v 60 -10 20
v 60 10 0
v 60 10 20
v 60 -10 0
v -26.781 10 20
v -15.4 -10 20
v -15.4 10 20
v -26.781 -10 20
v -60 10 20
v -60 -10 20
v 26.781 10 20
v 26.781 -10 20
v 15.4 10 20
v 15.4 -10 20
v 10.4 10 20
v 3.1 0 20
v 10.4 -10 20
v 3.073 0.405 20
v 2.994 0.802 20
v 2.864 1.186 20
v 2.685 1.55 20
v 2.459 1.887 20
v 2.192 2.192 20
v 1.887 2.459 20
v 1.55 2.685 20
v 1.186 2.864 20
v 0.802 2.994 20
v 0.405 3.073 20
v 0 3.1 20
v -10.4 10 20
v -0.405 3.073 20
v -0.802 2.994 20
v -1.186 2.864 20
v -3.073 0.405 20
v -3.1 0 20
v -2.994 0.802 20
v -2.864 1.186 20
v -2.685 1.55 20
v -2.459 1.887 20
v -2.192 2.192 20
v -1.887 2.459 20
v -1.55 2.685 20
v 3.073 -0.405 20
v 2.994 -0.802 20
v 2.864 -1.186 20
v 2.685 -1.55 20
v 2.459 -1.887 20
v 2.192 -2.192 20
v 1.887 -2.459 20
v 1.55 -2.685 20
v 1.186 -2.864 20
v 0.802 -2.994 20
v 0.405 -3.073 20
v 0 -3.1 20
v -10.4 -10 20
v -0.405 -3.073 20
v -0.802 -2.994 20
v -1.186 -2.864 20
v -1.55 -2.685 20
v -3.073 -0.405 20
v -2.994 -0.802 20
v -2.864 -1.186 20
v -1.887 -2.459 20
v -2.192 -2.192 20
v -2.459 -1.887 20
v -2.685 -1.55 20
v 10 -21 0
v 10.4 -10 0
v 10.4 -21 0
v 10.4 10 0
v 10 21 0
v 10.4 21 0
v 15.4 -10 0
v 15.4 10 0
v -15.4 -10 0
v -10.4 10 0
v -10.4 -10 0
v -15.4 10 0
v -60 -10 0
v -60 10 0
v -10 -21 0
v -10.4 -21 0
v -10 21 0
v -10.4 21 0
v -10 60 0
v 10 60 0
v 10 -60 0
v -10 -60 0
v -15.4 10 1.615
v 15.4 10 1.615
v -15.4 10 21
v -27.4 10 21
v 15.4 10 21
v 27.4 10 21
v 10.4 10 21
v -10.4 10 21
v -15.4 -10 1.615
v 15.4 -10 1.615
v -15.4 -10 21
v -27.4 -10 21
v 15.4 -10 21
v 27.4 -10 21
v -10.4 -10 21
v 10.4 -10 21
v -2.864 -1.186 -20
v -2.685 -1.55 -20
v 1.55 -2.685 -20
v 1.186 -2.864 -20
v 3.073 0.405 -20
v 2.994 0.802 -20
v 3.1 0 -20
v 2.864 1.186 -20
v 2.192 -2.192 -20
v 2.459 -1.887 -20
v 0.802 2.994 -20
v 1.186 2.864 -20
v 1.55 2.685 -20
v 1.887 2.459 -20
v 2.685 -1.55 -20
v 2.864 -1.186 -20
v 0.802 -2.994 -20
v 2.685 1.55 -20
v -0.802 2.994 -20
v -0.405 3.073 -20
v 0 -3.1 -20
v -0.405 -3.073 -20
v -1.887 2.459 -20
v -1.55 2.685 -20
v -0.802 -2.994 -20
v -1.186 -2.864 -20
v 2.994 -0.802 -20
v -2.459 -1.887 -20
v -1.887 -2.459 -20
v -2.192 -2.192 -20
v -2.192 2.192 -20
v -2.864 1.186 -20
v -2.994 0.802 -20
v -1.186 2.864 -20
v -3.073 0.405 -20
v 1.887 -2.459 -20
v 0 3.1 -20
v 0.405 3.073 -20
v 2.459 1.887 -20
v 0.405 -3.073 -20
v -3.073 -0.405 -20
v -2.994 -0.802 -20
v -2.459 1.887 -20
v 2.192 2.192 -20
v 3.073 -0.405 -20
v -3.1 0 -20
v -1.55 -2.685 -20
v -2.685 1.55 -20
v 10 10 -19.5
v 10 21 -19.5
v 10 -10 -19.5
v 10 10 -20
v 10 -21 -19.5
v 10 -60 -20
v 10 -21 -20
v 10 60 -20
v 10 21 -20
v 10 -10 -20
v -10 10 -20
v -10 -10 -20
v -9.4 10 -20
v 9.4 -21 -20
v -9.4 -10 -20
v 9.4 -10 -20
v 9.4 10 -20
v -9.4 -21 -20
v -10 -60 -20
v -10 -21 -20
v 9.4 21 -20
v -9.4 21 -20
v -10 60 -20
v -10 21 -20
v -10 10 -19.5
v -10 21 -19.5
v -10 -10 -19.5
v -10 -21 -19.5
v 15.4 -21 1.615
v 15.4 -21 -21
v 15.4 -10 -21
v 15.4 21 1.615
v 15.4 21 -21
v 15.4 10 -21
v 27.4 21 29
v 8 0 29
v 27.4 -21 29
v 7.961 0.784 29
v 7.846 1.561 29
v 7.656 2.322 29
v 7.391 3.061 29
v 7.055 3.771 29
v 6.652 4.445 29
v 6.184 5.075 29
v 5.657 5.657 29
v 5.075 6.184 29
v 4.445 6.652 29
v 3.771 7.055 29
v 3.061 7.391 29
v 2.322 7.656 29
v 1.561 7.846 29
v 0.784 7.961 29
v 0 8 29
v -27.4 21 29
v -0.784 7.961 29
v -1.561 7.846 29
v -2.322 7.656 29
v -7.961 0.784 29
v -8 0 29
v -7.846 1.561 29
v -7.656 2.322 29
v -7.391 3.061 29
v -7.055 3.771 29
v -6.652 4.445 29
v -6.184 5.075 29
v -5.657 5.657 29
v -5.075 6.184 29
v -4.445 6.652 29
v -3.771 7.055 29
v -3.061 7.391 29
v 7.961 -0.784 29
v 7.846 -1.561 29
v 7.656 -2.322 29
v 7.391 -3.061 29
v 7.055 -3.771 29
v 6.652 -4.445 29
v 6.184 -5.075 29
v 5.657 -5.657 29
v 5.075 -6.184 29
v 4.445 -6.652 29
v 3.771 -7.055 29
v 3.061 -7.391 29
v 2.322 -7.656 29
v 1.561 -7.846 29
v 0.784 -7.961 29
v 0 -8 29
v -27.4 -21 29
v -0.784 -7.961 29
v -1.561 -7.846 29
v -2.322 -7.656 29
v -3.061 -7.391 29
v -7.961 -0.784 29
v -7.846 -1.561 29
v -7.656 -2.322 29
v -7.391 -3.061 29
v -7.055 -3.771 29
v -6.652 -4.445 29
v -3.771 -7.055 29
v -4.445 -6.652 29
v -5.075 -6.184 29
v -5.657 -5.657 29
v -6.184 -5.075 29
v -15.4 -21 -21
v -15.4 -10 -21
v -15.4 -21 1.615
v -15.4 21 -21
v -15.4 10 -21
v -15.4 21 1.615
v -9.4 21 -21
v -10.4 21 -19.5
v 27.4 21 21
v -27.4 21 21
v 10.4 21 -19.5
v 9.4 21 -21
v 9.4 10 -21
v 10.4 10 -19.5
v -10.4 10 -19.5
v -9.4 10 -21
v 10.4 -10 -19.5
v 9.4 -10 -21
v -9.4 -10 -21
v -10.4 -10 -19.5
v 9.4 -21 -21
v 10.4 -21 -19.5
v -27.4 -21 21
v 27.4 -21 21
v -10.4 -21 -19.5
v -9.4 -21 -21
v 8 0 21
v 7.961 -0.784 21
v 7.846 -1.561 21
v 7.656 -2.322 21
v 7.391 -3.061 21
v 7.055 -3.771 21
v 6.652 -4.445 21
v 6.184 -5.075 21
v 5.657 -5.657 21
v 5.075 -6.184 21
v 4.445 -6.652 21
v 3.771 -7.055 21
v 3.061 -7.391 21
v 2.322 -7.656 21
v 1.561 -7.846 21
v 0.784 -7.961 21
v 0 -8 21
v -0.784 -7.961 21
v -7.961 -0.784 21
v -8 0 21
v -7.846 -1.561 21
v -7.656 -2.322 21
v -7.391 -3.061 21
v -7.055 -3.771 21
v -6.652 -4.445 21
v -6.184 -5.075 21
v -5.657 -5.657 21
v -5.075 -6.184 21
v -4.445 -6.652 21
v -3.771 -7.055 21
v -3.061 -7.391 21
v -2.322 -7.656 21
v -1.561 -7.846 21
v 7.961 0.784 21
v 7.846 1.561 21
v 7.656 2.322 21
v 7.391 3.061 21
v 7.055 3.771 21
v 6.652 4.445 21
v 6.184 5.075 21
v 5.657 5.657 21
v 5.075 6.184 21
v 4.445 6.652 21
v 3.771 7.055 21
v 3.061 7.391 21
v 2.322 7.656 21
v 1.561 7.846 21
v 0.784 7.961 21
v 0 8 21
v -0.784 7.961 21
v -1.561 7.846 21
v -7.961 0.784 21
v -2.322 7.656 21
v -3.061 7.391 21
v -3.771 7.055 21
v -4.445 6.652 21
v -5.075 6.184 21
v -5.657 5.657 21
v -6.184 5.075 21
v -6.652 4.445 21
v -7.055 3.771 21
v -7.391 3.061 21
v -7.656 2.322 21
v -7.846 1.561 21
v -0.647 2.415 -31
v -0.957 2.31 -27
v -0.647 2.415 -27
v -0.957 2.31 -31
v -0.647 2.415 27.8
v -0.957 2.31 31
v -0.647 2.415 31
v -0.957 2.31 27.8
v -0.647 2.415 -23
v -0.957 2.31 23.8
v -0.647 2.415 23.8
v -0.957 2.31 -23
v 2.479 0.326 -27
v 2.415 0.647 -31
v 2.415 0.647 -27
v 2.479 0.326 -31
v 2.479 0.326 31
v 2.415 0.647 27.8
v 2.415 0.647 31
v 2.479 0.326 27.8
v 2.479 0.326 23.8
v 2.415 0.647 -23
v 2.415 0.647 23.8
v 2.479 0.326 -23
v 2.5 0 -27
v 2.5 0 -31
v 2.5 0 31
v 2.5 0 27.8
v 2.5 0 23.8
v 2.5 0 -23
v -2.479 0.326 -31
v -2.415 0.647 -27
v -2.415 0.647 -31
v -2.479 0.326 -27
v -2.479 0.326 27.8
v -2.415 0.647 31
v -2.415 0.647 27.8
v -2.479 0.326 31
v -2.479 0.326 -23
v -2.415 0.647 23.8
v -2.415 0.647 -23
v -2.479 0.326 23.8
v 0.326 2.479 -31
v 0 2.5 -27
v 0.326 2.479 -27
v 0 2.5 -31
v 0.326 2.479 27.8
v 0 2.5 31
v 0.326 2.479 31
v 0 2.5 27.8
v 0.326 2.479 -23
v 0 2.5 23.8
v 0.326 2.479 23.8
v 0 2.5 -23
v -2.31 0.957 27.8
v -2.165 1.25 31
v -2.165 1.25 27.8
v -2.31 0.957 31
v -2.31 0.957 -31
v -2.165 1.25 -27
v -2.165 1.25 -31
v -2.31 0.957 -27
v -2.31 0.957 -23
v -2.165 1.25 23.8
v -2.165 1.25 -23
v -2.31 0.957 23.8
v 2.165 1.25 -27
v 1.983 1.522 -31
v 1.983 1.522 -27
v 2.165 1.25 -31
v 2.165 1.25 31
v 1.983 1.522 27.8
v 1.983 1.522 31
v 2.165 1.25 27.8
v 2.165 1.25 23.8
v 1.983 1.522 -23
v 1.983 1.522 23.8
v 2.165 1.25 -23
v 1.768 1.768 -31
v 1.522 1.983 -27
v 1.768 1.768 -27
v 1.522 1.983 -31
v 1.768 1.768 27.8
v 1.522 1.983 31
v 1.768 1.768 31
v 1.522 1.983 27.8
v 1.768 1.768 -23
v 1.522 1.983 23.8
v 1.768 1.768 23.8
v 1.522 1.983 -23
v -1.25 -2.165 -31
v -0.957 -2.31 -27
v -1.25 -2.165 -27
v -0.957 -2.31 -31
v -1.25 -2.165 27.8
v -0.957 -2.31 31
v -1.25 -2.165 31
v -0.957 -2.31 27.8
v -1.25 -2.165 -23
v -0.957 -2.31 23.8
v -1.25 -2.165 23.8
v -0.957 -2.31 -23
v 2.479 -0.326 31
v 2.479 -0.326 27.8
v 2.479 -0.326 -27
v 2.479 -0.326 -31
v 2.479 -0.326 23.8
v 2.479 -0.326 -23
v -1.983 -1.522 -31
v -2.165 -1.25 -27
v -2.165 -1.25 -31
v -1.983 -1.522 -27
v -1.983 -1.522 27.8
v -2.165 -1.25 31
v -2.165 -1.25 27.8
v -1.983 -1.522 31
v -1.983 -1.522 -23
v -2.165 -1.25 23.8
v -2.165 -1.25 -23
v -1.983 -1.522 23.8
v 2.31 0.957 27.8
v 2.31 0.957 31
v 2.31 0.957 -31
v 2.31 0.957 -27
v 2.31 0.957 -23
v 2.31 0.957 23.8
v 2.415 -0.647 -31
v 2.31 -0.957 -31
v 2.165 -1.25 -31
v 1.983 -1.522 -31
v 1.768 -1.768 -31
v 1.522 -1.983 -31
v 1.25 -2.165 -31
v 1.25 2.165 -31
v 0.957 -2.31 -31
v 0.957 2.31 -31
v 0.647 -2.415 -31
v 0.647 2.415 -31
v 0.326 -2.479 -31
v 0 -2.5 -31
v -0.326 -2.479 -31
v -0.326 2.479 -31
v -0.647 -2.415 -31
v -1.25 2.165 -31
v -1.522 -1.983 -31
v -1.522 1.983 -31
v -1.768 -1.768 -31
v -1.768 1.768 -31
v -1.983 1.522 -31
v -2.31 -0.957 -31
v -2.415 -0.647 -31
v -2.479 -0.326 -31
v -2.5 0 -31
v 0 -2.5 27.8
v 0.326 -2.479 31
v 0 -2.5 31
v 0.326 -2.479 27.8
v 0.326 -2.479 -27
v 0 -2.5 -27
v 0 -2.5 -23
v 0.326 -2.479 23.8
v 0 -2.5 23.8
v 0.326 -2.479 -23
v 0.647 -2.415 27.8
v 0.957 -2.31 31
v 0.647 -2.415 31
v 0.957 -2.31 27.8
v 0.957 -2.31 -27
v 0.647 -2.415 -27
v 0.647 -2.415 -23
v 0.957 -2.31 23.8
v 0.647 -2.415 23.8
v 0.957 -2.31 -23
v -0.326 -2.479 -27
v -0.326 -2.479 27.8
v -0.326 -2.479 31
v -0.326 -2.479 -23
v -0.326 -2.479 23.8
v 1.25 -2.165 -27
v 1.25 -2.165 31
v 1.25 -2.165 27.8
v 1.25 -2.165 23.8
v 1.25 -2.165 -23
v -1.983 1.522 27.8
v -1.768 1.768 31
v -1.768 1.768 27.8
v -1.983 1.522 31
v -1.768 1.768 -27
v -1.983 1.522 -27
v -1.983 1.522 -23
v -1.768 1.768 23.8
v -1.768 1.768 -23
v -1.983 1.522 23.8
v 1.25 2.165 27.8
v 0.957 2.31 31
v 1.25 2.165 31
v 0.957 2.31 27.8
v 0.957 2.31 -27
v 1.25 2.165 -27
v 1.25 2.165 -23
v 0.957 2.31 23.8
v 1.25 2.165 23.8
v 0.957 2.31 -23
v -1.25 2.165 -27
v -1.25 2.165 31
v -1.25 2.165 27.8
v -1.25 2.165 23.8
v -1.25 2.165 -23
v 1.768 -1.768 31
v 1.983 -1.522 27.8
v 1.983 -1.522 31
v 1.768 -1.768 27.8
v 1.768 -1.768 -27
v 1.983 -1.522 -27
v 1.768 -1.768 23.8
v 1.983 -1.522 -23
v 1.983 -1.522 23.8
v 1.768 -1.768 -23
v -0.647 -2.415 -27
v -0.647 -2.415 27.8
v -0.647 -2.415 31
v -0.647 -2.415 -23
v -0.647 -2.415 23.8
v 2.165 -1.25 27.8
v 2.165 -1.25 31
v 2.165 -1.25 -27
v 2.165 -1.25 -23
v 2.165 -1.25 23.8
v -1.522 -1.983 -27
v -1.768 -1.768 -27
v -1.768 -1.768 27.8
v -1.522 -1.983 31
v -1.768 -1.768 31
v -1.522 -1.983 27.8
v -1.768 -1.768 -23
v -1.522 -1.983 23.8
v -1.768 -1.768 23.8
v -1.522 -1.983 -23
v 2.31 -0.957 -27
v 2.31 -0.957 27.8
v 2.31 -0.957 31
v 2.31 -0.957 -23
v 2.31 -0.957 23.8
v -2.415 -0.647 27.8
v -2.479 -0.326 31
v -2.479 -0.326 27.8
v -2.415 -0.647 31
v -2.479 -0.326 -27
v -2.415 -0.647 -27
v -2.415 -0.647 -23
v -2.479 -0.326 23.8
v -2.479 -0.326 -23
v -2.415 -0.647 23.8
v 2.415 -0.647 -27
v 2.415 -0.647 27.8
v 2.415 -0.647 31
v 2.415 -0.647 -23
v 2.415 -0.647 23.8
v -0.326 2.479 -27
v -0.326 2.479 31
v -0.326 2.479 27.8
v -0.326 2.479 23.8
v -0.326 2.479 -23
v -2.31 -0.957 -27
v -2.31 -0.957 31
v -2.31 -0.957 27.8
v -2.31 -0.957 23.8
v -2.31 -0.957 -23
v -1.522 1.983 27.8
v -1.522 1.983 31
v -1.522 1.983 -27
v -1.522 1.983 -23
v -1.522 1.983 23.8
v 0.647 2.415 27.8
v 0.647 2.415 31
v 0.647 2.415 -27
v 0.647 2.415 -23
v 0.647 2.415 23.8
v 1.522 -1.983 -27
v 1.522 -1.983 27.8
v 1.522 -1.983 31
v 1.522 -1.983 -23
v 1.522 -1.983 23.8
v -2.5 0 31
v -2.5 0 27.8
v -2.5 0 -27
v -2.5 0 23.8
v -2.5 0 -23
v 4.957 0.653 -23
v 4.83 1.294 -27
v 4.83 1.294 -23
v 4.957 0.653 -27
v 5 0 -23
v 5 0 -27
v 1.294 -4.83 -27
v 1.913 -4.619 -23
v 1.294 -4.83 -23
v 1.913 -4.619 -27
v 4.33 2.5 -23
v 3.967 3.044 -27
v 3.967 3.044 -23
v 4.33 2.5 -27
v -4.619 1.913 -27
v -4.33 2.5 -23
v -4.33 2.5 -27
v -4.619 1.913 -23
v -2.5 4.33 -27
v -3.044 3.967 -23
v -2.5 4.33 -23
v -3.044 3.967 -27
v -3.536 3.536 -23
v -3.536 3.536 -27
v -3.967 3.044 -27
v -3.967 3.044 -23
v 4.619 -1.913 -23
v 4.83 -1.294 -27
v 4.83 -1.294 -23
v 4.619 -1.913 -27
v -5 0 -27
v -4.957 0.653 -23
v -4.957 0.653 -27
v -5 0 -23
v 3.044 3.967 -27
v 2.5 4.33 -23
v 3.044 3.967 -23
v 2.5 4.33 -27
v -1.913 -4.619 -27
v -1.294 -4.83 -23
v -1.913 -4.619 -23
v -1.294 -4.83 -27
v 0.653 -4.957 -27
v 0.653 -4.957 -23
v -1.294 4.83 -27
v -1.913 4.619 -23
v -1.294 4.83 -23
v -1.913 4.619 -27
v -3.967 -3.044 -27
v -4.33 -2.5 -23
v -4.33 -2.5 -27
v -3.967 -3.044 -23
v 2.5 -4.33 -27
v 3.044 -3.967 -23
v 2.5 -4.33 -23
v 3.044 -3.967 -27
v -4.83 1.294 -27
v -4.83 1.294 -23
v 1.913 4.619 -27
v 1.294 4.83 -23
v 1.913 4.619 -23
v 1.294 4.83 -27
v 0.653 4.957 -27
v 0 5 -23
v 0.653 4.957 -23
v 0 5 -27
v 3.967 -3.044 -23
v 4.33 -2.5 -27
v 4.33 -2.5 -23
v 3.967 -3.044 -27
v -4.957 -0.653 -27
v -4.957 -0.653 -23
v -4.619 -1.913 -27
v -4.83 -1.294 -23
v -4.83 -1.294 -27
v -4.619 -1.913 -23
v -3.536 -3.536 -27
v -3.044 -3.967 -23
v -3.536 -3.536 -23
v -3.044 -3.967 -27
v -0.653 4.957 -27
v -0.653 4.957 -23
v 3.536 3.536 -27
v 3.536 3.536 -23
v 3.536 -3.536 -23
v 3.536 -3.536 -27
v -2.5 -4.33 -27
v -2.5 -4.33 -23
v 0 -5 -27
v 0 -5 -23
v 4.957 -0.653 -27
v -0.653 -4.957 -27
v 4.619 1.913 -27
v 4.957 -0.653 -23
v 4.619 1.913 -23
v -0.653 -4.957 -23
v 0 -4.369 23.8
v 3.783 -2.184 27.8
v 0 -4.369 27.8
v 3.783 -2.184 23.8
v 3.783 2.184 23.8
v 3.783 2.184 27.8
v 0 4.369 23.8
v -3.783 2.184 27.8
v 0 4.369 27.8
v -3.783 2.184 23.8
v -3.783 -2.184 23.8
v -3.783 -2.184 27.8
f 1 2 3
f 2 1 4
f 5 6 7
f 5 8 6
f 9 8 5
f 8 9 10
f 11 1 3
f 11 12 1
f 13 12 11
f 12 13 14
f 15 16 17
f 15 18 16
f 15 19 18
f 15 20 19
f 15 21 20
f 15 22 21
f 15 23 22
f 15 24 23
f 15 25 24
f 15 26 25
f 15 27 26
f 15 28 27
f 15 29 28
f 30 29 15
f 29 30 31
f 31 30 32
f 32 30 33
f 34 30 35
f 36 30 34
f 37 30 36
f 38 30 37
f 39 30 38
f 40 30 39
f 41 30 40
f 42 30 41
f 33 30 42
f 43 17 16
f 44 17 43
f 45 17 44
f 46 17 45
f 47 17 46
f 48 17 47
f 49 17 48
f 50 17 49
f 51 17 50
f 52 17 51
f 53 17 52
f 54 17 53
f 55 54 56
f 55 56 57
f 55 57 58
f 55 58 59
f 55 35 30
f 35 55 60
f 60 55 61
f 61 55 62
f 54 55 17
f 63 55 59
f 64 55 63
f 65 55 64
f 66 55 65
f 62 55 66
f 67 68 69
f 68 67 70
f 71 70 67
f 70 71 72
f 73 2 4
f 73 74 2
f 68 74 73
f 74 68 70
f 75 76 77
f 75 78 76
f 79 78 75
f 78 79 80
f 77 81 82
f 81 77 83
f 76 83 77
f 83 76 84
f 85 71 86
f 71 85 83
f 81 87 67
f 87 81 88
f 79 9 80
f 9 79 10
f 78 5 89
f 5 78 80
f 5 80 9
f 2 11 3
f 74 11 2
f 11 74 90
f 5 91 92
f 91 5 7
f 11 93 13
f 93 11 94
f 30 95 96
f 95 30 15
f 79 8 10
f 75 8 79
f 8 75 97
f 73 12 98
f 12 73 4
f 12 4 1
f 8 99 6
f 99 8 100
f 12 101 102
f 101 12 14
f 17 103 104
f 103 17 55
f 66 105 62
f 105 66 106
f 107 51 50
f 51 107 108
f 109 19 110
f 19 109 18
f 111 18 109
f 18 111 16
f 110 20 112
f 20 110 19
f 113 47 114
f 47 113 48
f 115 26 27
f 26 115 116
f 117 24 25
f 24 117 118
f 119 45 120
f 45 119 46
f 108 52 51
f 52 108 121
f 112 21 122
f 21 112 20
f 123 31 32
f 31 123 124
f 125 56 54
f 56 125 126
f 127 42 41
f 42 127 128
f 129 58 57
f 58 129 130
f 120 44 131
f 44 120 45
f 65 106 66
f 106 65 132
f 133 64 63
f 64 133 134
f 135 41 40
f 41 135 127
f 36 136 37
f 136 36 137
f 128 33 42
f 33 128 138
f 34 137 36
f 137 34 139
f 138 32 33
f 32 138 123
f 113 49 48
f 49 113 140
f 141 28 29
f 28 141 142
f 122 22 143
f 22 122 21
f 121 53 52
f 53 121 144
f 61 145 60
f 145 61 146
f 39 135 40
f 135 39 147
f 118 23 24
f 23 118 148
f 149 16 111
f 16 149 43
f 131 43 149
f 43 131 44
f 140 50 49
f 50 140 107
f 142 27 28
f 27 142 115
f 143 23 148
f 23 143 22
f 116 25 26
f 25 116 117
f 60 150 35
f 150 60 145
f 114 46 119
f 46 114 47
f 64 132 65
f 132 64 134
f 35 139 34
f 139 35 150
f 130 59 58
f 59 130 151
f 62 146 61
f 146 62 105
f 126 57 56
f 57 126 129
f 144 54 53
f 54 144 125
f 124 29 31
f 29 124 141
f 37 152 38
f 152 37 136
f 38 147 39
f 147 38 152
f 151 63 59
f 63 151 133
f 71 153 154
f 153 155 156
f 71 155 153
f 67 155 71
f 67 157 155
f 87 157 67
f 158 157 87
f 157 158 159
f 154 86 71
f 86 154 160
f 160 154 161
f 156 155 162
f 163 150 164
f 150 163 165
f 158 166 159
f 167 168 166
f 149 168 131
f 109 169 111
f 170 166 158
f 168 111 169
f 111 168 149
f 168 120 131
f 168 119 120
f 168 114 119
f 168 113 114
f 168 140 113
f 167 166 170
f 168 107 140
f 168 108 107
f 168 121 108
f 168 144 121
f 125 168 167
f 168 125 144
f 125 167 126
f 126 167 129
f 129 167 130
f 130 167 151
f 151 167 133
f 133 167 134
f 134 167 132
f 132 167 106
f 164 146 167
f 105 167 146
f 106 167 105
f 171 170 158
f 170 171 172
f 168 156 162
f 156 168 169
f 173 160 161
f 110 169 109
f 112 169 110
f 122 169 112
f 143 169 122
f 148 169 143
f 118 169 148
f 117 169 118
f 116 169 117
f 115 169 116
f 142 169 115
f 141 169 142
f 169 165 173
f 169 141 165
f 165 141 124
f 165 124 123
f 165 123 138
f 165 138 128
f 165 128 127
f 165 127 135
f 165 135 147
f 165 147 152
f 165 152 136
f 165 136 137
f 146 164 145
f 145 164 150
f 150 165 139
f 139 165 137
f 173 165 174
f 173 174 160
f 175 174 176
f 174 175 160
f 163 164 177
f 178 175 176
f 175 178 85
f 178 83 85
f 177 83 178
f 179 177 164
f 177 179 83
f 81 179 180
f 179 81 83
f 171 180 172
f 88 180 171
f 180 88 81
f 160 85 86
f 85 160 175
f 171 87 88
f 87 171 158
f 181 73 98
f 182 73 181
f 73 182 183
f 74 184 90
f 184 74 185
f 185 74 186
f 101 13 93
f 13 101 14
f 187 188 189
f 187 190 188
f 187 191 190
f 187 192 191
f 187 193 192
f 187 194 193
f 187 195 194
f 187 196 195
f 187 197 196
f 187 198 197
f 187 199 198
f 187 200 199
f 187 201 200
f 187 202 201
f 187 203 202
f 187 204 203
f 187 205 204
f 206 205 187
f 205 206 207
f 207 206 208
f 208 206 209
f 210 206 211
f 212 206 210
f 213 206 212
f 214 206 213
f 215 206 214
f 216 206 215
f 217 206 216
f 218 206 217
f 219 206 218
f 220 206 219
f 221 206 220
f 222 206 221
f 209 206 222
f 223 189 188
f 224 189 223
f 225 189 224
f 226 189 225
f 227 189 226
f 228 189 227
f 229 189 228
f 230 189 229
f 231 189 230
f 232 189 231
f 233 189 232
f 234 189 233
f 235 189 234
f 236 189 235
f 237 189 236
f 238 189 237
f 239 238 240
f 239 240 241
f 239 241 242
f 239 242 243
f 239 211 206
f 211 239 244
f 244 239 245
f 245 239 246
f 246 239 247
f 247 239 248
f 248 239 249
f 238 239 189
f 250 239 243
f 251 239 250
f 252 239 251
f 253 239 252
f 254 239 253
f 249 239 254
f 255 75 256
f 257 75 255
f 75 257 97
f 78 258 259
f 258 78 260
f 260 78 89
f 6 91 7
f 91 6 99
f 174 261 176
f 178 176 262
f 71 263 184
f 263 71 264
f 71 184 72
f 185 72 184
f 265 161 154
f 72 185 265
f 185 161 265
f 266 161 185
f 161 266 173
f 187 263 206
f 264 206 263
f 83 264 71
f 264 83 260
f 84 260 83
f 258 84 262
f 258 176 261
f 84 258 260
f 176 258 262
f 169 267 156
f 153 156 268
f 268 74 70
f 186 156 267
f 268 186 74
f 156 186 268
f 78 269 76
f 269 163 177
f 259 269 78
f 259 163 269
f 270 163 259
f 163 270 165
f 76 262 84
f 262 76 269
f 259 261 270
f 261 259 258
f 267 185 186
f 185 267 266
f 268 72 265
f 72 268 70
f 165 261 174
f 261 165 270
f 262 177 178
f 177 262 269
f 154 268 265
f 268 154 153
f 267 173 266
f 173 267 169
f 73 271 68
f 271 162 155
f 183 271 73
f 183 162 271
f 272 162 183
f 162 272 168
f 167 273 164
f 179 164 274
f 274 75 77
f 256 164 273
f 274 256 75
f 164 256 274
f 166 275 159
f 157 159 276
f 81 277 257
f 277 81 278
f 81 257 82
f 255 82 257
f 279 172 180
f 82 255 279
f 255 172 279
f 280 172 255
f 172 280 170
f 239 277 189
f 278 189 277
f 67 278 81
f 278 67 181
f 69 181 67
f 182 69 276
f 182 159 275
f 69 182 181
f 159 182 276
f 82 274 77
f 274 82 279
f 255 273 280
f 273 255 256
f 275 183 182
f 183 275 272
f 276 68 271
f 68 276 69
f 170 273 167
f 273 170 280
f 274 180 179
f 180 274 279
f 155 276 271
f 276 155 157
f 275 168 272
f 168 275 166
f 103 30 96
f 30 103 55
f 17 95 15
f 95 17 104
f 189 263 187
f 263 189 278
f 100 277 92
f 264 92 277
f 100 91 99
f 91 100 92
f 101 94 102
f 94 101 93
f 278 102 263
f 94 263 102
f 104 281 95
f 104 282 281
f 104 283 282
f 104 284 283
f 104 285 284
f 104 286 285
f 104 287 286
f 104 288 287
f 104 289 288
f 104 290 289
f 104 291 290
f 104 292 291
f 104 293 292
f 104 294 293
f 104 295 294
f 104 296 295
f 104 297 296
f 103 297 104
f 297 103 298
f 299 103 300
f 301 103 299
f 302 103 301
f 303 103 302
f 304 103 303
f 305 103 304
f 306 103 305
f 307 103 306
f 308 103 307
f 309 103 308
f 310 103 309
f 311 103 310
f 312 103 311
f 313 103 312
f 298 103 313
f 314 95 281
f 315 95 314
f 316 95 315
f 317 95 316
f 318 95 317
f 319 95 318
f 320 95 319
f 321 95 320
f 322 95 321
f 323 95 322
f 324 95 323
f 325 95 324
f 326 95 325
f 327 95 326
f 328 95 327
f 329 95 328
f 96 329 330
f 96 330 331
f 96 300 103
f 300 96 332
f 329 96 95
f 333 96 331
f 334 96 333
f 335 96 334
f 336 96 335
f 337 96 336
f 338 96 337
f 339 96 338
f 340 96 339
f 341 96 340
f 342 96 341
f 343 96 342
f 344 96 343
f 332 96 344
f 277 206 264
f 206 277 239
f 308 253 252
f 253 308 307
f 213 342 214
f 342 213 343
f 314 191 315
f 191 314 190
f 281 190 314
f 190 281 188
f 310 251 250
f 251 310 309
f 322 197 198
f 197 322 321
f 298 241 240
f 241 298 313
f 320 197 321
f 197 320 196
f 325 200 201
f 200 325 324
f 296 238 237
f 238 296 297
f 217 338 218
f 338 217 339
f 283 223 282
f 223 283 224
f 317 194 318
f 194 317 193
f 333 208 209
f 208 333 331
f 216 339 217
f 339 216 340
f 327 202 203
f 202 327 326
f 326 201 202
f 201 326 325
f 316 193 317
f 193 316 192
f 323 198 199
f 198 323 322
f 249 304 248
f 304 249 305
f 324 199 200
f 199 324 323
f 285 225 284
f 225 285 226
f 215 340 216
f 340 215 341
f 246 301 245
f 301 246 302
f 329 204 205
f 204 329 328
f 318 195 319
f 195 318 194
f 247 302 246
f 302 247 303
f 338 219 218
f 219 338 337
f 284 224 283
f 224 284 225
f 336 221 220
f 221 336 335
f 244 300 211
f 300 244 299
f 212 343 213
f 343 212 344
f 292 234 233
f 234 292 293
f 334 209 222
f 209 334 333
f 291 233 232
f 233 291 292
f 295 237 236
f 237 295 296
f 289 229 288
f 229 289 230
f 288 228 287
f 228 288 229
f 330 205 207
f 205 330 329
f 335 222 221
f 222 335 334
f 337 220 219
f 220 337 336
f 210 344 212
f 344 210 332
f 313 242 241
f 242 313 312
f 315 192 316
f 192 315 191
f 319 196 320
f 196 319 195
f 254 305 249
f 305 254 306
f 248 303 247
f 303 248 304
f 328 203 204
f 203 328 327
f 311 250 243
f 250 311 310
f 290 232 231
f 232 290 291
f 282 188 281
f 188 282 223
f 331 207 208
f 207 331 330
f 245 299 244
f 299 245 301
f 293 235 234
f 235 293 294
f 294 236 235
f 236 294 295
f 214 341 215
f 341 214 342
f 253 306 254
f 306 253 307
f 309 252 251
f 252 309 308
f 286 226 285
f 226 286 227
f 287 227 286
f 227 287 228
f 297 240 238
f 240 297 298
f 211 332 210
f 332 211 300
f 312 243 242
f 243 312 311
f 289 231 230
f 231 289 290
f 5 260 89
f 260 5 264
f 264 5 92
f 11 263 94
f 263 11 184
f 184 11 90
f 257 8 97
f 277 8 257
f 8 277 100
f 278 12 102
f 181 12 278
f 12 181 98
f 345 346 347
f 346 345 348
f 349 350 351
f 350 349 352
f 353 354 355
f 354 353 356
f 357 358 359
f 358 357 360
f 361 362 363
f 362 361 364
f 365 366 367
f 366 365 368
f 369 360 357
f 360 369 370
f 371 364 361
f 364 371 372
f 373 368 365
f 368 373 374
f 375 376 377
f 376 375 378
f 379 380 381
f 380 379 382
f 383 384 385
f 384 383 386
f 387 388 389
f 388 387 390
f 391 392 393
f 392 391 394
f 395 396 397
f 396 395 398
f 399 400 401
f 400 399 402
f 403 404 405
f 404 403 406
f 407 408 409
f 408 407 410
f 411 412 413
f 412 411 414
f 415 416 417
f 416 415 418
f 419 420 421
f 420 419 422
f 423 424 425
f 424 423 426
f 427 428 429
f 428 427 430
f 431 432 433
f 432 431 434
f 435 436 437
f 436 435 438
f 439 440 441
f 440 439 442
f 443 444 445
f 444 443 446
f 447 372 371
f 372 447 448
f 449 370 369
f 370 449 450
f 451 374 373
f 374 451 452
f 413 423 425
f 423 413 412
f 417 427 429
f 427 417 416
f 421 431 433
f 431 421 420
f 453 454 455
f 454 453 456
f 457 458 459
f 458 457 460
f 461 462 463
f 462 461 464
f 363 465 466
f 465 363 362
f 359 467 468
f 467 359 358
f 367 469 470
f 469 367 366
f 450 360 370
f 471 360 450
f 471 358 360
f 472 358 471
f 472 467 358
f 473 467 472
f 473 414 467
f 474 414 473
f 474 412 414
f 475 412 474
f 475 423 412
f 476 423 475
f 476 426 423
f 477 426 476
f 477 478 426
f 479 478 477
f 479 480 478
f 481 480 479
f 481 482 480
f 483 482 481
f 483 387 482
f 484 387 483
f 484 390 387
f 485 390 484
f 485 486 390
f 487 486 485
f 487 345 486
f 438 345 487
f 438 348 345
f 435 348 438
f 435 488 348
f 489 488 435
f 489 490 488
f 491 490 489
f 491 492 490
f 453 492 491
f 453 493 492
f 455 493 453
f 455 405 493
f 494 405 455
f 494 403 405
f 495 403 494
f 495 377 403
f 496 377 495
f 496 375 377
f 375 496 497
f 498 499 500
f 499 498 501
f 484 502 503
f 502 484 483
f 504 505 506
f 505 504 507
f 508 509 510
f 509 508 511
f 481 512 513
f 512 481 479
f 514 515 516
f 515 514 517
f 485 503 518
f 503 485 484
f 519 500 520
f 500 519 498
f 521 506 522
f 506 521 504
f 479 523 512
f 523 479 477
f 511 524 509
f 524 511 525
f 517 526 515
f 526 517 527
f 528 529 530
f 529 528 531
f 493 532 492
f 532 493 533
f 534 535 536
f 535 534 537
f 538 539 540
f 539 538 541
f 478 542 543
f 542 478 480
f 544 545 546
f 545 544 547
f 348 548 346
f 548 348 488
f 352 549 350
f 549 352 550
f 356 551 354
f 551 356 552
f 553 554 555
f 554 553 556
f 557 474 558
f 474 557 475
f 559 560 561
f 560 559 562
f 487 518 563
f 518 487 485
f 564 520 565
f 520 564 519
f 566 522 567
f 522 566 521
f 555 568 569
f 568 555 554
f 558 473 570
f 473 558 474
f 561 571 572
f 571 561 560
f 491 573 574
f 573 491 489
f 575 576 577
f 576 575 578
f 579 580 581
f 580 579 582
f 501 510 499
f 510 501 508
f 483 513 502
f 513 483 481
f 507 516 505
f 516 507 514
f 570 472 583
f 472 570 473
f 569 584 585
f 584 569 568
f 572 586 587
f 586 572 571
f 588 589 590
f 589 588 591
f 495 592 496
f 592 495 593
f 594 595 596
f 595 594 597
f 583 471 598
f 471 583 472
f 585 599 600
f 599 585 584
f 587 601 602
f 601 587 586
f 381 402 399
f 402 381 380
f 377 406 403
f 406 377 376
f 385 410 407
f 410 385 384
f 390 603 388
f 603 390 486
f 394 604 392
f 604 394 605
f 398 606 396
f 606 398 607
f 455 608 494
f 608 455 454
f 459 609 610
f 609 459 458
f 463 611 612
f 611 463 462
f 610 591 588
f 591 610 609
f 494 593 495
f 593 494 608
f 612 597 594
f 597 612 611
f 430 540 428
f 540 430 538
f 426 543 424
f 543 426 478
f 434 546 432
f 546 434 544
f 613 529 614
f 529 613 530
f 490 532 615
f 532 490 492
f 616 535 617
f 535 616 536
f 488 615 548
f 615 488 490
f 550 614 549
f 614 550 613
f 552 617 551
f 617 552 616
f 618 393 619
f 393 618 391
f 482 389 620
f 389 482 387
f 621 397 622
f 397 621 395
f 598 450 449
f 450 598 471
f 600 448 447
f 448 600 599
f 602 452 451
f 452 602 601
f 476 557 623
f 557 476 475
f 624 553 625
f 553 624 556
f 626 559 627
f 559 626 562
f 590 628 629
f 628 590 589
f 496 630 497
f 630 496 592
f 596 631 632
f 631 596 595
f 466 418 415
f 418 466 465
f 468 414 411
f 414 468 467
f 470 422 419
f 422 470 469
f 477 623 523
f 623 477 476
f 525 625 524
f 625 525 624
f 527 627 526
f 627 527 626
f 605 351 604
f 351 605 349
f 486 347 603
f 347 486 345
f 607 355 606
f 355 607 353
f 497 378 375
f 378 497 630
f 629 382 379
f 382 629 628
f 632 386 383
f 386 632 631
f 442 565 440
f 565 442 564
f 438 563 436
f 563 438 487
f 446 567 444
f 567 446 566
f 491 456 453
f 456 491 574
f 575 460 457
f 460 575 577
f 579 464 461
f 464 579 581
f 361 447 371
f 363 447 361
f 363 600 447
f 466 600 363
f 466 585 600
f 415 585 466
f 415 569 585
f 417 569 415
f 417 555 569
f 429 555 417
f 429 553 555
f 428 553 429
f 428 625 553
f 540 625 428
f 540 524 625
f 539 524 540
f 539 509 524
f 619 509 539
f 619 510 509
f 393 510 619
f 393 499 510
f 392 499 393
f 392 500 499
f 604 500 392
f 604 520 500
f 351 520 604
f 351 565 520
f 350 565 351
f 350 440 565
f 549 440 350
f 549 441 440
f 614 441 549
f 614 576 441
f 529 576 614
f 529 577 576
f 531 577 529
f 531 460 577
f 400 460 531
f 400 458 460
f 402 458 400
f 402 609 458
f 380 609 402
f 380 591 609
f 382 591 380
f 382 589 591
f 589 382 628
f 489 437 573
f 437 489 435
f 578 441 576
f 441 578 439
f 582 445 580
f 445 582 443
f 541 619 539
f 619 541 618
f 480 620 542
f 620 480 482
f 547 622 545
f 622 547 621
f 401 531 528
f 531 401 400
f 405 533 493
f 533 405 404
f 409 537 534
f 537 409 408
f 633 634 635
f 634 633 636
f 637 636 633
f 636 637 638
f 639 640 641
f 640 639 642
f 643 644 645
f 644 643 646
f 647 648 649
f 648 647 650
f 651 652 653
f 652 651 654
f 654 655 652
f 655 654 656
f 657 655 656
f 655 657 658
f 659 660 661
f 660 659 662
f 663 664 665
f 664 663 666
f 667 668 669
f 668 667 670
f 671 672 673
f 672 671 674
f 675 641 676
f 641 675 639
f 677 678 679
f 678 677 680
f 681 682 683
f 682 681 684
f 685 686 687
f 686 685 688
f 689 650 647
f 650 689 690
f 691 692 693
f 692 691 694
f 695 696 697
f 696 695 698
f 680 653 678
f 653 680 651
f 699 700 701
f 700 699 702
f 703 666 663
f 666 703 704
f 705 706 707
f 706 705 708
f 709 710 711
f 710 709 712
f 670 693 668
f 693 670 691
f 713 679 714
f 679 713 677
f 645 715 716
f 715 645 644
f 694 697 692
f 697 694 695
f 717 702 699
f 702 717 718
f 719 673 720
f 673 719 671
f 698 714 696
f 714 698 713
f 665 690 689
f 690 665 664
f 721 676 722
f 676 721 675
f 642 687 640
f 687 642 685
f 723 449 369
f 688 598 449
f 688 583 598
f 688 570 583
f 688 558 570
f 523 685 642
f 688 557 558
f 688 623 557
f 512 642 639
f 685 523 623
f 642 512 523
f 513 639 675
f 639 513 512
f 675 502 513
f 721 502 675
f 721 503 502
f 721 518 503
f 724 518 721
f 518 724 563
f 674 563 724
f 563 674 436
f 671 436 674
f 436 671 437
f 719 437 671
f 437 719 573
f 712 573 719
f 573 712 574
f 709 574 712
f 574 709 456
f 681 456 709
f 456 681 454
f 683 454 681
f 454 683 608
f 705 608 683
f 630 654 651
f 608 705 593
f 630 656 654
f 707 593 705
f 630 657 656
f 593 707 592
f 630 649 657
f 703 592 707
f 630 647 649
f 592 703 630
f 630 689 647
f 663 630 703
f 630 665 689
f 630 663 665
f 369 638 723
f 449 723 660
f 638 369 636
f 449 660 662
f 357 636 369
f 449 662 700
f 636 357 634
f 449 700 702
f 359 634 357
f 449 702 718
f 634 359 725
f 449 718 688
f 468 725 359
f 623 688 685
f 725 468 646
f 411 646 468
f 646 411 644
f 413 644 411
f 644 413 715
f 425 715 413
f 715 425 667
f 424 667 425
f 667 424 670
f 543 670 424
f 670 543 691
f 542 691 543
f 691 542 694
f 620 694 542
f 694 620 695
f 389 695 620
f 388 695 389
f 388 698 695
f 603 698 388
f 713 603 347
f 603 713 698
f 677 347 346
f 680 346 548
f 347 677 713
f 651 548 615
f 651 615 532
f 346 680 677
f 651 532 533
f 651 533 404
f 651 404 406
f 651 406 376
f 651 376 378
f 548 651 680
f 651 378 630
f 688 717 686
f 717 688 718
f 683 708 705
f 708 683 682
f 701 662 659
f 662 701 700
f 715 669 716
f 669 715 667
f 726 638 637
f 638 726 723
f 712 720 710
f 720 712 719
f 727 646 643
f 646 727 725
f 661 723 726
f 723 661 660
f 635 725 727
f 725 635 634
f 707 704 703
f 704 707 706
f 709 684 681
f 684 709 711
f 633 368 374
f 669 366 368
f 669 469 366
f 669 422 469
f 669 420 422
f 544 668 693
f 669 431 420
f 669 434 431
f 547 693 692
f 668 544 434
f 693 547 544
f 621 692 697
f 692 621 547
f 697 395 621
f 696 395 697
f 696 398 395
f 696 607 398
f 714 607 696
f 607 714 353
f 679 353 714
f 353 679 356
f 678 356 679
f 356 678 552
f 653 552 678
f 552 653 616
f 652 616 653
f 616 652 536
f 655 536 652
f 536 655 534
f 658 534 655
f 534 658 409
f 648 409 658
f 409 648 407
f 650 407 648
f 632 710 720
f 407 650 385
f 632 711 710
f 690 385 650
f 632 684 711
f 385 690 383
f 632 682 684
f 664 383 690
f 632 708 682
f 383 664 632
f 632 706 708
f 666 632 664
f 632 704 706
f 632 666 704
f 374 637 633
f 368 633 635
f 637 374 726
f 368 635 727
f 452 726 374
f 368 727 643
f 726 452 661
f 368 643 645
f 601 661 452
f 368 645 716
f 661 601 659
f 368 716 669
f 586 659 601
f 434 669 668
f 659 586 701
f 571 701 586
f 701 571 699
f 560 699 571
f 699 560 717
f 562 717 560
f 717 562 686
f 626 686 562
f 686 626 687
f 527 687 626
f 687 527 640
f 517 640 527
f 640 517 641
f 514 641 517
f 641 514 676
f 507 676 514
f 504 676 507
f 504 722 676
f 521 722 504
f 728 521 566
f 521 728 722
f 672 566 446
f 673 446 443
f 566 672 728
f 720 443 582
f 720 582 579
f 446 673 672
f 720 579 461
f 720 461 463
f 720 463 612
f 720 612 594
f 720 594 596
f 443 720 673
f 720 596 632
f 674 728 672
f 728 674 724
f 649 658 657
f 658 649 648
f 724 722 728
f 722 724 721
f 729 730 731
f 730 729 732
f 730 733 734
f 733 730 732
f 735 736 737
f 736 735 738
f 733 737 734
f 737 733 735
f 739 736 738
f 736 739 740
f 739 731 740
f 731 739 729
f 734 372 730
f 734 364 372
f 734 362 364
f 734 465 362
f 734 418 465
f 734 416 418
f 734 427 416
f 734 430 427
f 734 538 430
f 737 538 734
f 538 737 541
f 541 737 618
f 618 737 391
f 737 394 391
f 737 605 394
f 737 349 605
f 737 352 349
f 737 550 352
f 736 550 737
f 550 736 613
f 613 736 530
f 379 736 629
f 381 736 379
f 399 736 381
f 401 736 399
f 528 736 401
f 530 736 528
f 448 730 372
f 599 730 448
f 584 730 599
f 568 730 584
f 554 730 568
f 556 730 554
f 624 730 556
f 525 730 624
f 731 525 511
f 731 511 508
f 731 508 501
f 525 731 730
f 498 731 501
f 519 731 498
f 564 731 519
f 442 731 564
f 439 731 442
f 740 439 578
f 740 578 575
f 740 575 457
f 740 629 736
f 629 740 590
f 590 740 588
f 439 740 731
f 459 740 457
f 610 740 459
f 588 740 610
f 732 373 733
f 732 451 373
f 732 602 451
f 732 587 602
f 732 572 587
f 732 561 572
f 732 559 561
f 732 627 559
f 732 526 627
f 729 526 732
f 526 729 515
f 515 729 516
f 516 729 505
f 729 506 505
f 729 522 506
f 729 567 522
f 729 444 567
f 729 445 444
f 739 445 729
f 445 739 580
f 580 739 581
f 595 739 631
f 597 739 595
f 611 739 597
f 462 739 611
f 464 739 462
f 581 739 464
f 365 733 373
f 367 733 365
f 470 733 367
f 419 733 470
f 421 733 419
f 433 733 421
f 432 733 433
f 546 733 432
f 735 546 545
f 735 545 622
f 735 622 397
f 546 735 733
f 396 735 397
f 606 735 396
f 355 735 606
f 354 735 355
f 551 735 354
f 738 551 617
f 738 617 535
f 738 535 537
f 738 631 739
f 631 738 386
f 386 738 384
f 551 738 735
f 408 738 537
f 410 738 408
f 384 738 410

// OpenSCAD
// file: ../perpendicular-u-joint-guard-v1.3-triangular-corner-fills/candidate_triangular_corner_fills.scad
// Candidate v1.3: four triangular concave-corner fill blocks.
//
// Base: accepted v0.7 eaves12 geometry. v0.9/v1.0/v1.1/v1.2 are not
// imported. Each corner block is a real triangular prism: broad at the roof,
// tapering continuously toward z=0, and overlapping the U side wall.

use <../perpendicular-u-joint-guard-v0.7/perpendicular_double_u_guard.scad>;

$fn = 48;
PART = "candidate_iso";

// Explicit v0.7 interface values.
roof_x_outer = 27.4;       // accepted eaves12 roof: -27.4..+27.4
side_wall_x_outer = 15.4;  // existing side-wall outer edge
blue_tube_x_outer = 10.0;  // blue lower 20x20 tube half-width
plate_y_inner = 10.0;
plate_y_outer = 21.0;
plate_depth_y = plate_y_outer - plate_y_inner; // 11 mm per front/back U plate

// The top edge is 0.5 mm inside the roof volume (roof underside z=21), and
// the lower point enters the side wall by 1 mm in X.  The XZ area therefore
// has positive overlap at both ends, not edge-only contact.
triangle_top_z = 21.5;
triangle_bottom_z = 0.0;
triangle_roof_overlap_z = triangle_top_z - 21.0;
triangle_side_overlap_x = 1.0;
triangle_inner_x = side_wall_x_outer - triangle_side_overlap_x; // 14.4

// Bottom retaining-hook contract copied from v0.7 for explicit verification.
hook_height_z = 1.5;
u_bottom_z = -21.0;
hook_top_z = u_bottom_z + hook_height_z; // -19.5

assert(plate_depth_y == 11, "每个三角块的前后板深必须是 11 mm");
assert(triangle_top_z > 21 && triangle_bottom_z == 0,
       "三角块上端必须搭入屋檐、下端落到 z=0");
assert(triangle_inner_x > blue_tube_x_outer,
       "三角块下端不得进入蓝色方管 x=-10..+10 包络");
assert(triangle_side_overlap_x > 0 && triangle_roof_overlap_z > 0,
       "三角块必须与屋檐和侧墙都有正重叠");
assert(hook_height_z == 1.5 && u_bottom_z == -21 && hook_top_z == -19.5,
       "底部卡脚必须保持 z=-21..-19.5");

// A polygon in XZ is extruded only through the corresponding front/back U
// plate. The center y=-10..+10 passage remains open.
module triangular_fill_xz(points, yc) {
    translate([0, yc, 0])
        rotate([90, 0, 0])
            linear_extrude(height = plate_depth_y,
                           center = true,
                           convexity = 10)
                polygon(points = points);
}

module front_neg_x_triangle() {
    // -X roof end -> +X inward. Top wide, lower point at the side wall.
    triangular_fill_xz([
        [-roof_x_outer, 21.0],
        [-triangle_inner_x, triangle_top_z],
        [-triangle_inner_x, triangle_bottom_z]
    ], (plate_y_inner + plate_y_outer) / 2);
}

module front_pos_x_triangle() {
    // +X roof end -> -X inward. Mirrored triangle.
    triangular_fill_xz([
        [roof_x_outer, 21.0],
        [triangle_inner_x, triangle_top_z],
        [triangle_inner_x, triangle_bottom_z]
    ], (plate_y_inner + plate_y_outer) / 2);
}

module back_neg_x_triangle() {
    triangular_fill_xz([
        [-roof_x_outer, 21.0],
        [-triangle_inner_x, triangle_top_z],
        [-triangle_inner_x, triangle_bottom_z]
    ], -(plate_y_inner + plate_y_outer) / 2);
}

module back_pos_x_triangle() {
    triangular_fill_xz([
        [roof_x_outer, 21.0],
        [triangle_inner_x, triangle_top_z],
        [triangle_inner_x, triangle_bottom_z]
    ], -(plate_y_inner + plate_y_outer) / 2);
}

module front_two_triangular_fills() {
    union() {
        front_neg_x_triangle();
        front_pos_x_triangle();
    }
}

module back_two_triangular_fills() {
    union() {
        back_neg_x_triangle();
        back_pos_x_triangle();
    }
}

module all_four_triangular_fills() {
    union() {
        front_two_triangular_fills();
        back_two_triangular_fills();
    }
}

module candidate_print_solid() {
    // Final hole operation is deliberately after the complete four-block
    // union; this preserves a true Z through-hole and the round nut pocket.
    difference() {
        union() {
            double_u_clip();
            all_four_triangular_fills();
        }
        vertical_screw_relief();
    }
}

module candidate_clip() {
    candidate_print_solid();
}

module candidate_assembly_iso() {
    upper_long_tube();
    lower_cross_tube();
    color([0.96, 0.39, 0.08]) double_u_clip();
    color([0.86, 0.13, 0.08]) front_two_triangular_fills();
    color([0.62, 0.12, 0.52]) back_two_triangular_fills();
    vertical_joint_screw();
}

module candidate_front_xz() {
    lower_cross_tube();
    color([0.96, 0.39, 0.08]) double_u_clip();
    color([0.86, 0.13, 0.08]) front_two_triangular_fills();
    vertical_joint_screw();
}

module candidate_back_xz() {
    lower_cross_tube();
    color([0.96, 0.39, 0.08]) double_u_clip();
    color([0.62, 0.12, 0.52]) back_two_triangular_fills();
    vertical_joint_screw();
}

module candidate_top_slice() {
    // At z=-0.5..2.5 the four blocks show their two front/back 11 mm bands;
    // the blue tube and the central y gap remain visible.
    slice_box = 200;
    color([0.28, 0.45, 0.78])
        intersection() {
            lower_cross_tube();
            translate([-slice_box / 2, -slice_box / 2, -0.5])
                cube([slice_box, slice_box, 3.0]);
        }
    color([0.96, 0.39, 0.08])
        intersection() {
            double_u_clip();
            translate([-slice_box / 2, -slice_box / 2, -0.5])
                cube([slice_box, slice_box, 3.0]);
        }
    color([0.86, 0.13, 0.08])
        intersection() {
            front_two_triangular_fills();
            translate([-slice_box / 2, -slice_box / 2, -0.5])
                cube([slice_box, slice_box, 3.0]);
        }
    color([0.62, 0.12, 0.52])
        intersection() {
            back_two_triangular_fills();
            translate([-slice_box / 2, -slice_box / 2, -0.5])
                cube([slice_box, slice_box, 3.0]);
        }
}

module candidate_hole_section() {
    // Center y=0 section: the bore and round nut pocket are shown without
    // confusing them with the bottom hook, which is outside this section.
    intersection() {
        candidate_print_solid();
        translate([-100, -0.4, -100]) cube([200, 0.8, 200]);
    }
}

module candidate_hook_check() {
    // Isolated lower detail: exact imported v0.7 U plate and blue tube, with
    // hook volumes highlighted only for review. This is not the print union.
    detail_box = 200;
    detail_z0 = -22;
    detail_h = 5;
    detail_y0 = 8;
    detail_ydepth = 15;
    intersection() {
        lower_cross_tube();
        translate([-detail_box / 2, detail_y0, detail_z0])
            cube([detail_box, detail_ydepth, detail_h]);
    }
    color([0.96, 0.39, 0.08])
        intersection() {
            u_plate(plate_y_inner, plate_y_outer);
            translate([-detail_box / 2, detail_y0, detail_z0])
                cube([detail_box, detail_ydepth, detail_h]);
        }
    color([0.20, 0.78, 0.20])
        intersection() {
            union() {
                translate([-13.65, 15.5, -20.25])
                    cube([3.5, 11, 1.5], center = true);
                translate([13.65, 15.5, -20.25])
                    cube([3.5, 11, 1.5], center = true);
            }
            translate([-detail_box / 2, detail_y0, detail_z0])
                cube([detail_box, detail_ydepth, detail_h]);
        }
}

if (PART == "candidate_clip") {
    candidate_clip();
} else if (PART == "candidate_front_xz") {
    candidate_front_xz();
} else if (PART == "candidate_back_xz") {
    candidate_back_xz();
} else if (PART == "candidate_top_slice") {
    candidate_top_slice();
} else if (PART == "candidate_hole_section") {
    candidate_hole_section();
} else if (PART == "candidate_hook_check") {
    candidate_hook_check();
} else {
    candidate_assembly_iso();
}
// file: full_nut_passage_guard.scad
// v1.4: keep the exact v1.3 body; remove the nut-pocket floor with one
// full-depth Ø16 cylindrical subtraction. Units: mm; Z positive upwards.
// Imported v1.3 geometry contains all four triangles and the lower hooks.
use <../perpendicular-u-joint-guard-v1.3-triangular-corner-fills/candidate_triangular_corner_fills.scad>;

$fn = 48;
PART = "clip";
nut_passage_d = 16.0;

module full_depth_nut_passage() {
    // Cutter extends z=-31..39, past the whole printed z=-21..29 envelope.
    // 64 facets match the existing Ø16 pocket, avoiding a stepped profile.
    translate([0, 0, 4])
        cylinder(d = nut_passage_d, h = 70, center = true, $fn = 64);
}

module guard_v1_4() {
    difference() {
        candidate_print_solid();
        full_depth_nut_passage();
    }
}

guard_v1_4();
// main file
// Review and Boolean checks of the actual v1.4 solid. No AI images.
use <full_nut_passage_guard.scad>;
use <../perpendicular-u-joint-guard-v1.3-triangular-corner-fills/candidate_triangular_corner_fills.scad>;
use <../perpendicular-u-joint-guard-v0.7/perpendicular_double_u_guard.scad>;

$fn = 48;
VIEW = "assembly";
OFFSET_Z = 0;

module tubes() { upper_long_tube(); lower_cross_tube(); }
module section() {
    intersection() {
        children();
        translate([-36, -0.025, -34]) cube([72, 0.05, 68]);
    }
}
module label_xz(value, x, z, size = 3.2, c = [0.1, 0.12, 0.15]) {
    color(c) translate([x, -1, z]) rotate([90, 0, 0])
        linear_extrude(height = 0.12)
            text(value, font = "Arial Unicode MS", size = size,
                 halign = "left", valign = "center");
}
module line_xz(a, b, c = [0.2, 0.23, 0.27], d = 0.24) {
    color(c) hull() {
        translate([a[0], -0.8, a[1]]) sphere(d = d, $fn = 12);
        translate([b[0], -0.8, b[1]]) sphere(d = d, $fn = 12);
    }
}
module section_fastener() {
    color([0.82, 0.82, 0.84]) section() difference() {
        vertical_joint_screw();
        translate([-12, -12, -27]) cube([24, 24, 4]);
        translate([-12, -12, 23.8]) cube([24, 24, 4]);
    }
    color([0.92, 0.70, 0.12]) section() intersection() {
        vertical_joint_screw();
        union() {
            translate([-12, -12, -27]) cube([24, 24, 4]);
            translate([-12, -12, 23.8]) cube([24, 24, 4]);
        }
    }
}
module assembled() {
    upper_long_tube();
    lower_cross_tube();
    color([0.96, 0.39, 0.08]) translate([0, 0, OFFSET_Z]) guard_v1_4();
    vertical_joint_screw();
}
module central_section() {
    color([0.96, 0.39, 0.08]) section() guard_v1_4();
    color([0.58, 0.61, 0.66]) section() upper_long_tube();
    color([0.28, 0.45, 0.78]) section() lower_cross_tube();
    section_fastener();

    label_xz("v1.4 装配中心剖面  y=0", -40, 43, 4.2);
    label_xz("打印件全深度 Ø16：上下开口连续、无窝底", -40, 37, 3.2);
    line_xz([8, 24], [35, 30]);
    label_xz("Ø16 螺帽通行孔", 39, 30, 3.5);
    label_xz("螺帽/螺杆保持预装位置", 39, 25, 3.0);
    line_xz([30, 11], [35, 11]);
    label_xz("上方管子（灰色）", 39, 11, 3.2);
    line_xz([9, -12], [35, -12]);
    label_xz("下方管子（蓝色）", 39, -12, 3.2, [0.18, 0.3, 0.6]);
    label_xz("铁管原 Ø6.2 螺丝孔保留", 39, -18, 2.9);
    label_xz("仅打印件扩至 Ø16；管子、螺丝、四角块、底扣均沿用原几何", -40, -41, 2.8);
    color([0.10, 0.62, 0.23]) {
        translate([-40, 0, -29]) cylinder(d = 0.55, h = 58);
        translate([-40, 0, 29]) cylinder(r1 = 1.8, r2 = 0, h = 4);
    }
    label_xz("+Z", -46, 34, 3.1, [0.10, 0.62, 0.23]);
    label_xz("-Z", -46, -33, 3.1, [0.10, 0.62, 0.23]);
}
module insertion_view() {
    // Show the actual model above fixed tubes. OFFSET_Z=52 puts its bottom
    // at z=31, above the fixed nut/head envelope; arrow is -Z motion.
    assembled();
    color([0.10, 0.62, 0.23]) {
        translate([40, -30, 38]) cylinder(d = 1.7, h = 31);
        translate([40, -30, 38]) rotate([180, 0, 0])
            cylinder(r1 = 4.5, r2 = 0, h = 9);
    }
    // Coordinate labels are actual SCAD text outside the assembly.
    color([0.1, 0.12, 0.15]) translate([-40, -5, 112])
        linear_extrude(height = 0.3)
            text("v1.4  沿 -Z 套入", font = "Arial Unicode MS", size = 5);
}

module interference_section() {
    // Red is the exact material intersection, not a hand-drawn indication.
    color([0.96, 0.39, 0.08]) section() difference() {
        guard_v1_4(); tubes();
    }
    color([0.58, 0.61, 0.66]) section() difference() {
        upper_long_tube(); guard_v1_4();
    }
    color([0.28, 0.45, 0.78]) section() lower_cross_tube();
    color([0.9, 0.03, 0.03]) section() intersection() {
        guard_v1_4(); upper_long_tube();
    }
    label_xz("原墙体装配干涉核对  y=0", -39, 42, 4.1);
    label_xz("红色是实体布尔交集：原侧墙与灰色上管相交", -39, 36, 3.1);
    line_xz([13, 11], [37, 15]);
    label_xz("原侧墙占用灰管通路", 41, 15, 3.4, [0.8, 0.04, 0.04]);
    label_xz("两侧 |X|=10.4..15.4", 41, 9, 2.9);
    label_xz("Y=-10..+10, Z=0..20", 41, 4, 2.9);
    label_xz("按本次约束保持原墙体；Ø16 通行孔已单独验证通过", -39, -33, 3.0);
}

if (VIEW == "section") central_section();
else if (VIEW == "insertion") insertion_view();
else if (VIEW == "interference_section") interference_section();
else if (VIEW == "clip") guard_v1_4();
else if (VIEW == "passage_obstruction") {
    // 0.001 mm diameter allowance excludes zero-volume coincident faces.
    intersection() {
        guard_v1_4();
        translate([0, 0, 4]) cylinder(d = 15.999, h = 70, center = true, $fn = 64);
    }
} else if (VIEW == "changed_outside_passage") {
    // Must be empty: no v1.3 material changes outside the Ø16 cutter.
    difference() {
        difference() { candidate_print_solid(); guard_v1_4(); }
        full_depth_nut_passage();
    }
} else if (VIEW == "tube_interference") {
    intersection() {
        translate([0, 0, OFFSET_Z]) guard_v1_4();
        tubes();
    }
} else if (VIEW == "upper_tube_interference") {
    intersection() { guard_v1_4(); upper_long_tube(); }
} else if (VIEW == "lower_tube_interference") {
    intersection() { guard_v1_4(); lower_cross_tube(); }
} else if (VIEW == "nut_motion_obstruction") {
    // Fixed installed hardware swept relative to the part during -Z travel.
    intersection() {
        guard_v1_4();
        hull() {
            vertical_joint_screw();
            translate([0, 0, -52]) vertical_joint_screw();
        }
    }
} else assembled();
